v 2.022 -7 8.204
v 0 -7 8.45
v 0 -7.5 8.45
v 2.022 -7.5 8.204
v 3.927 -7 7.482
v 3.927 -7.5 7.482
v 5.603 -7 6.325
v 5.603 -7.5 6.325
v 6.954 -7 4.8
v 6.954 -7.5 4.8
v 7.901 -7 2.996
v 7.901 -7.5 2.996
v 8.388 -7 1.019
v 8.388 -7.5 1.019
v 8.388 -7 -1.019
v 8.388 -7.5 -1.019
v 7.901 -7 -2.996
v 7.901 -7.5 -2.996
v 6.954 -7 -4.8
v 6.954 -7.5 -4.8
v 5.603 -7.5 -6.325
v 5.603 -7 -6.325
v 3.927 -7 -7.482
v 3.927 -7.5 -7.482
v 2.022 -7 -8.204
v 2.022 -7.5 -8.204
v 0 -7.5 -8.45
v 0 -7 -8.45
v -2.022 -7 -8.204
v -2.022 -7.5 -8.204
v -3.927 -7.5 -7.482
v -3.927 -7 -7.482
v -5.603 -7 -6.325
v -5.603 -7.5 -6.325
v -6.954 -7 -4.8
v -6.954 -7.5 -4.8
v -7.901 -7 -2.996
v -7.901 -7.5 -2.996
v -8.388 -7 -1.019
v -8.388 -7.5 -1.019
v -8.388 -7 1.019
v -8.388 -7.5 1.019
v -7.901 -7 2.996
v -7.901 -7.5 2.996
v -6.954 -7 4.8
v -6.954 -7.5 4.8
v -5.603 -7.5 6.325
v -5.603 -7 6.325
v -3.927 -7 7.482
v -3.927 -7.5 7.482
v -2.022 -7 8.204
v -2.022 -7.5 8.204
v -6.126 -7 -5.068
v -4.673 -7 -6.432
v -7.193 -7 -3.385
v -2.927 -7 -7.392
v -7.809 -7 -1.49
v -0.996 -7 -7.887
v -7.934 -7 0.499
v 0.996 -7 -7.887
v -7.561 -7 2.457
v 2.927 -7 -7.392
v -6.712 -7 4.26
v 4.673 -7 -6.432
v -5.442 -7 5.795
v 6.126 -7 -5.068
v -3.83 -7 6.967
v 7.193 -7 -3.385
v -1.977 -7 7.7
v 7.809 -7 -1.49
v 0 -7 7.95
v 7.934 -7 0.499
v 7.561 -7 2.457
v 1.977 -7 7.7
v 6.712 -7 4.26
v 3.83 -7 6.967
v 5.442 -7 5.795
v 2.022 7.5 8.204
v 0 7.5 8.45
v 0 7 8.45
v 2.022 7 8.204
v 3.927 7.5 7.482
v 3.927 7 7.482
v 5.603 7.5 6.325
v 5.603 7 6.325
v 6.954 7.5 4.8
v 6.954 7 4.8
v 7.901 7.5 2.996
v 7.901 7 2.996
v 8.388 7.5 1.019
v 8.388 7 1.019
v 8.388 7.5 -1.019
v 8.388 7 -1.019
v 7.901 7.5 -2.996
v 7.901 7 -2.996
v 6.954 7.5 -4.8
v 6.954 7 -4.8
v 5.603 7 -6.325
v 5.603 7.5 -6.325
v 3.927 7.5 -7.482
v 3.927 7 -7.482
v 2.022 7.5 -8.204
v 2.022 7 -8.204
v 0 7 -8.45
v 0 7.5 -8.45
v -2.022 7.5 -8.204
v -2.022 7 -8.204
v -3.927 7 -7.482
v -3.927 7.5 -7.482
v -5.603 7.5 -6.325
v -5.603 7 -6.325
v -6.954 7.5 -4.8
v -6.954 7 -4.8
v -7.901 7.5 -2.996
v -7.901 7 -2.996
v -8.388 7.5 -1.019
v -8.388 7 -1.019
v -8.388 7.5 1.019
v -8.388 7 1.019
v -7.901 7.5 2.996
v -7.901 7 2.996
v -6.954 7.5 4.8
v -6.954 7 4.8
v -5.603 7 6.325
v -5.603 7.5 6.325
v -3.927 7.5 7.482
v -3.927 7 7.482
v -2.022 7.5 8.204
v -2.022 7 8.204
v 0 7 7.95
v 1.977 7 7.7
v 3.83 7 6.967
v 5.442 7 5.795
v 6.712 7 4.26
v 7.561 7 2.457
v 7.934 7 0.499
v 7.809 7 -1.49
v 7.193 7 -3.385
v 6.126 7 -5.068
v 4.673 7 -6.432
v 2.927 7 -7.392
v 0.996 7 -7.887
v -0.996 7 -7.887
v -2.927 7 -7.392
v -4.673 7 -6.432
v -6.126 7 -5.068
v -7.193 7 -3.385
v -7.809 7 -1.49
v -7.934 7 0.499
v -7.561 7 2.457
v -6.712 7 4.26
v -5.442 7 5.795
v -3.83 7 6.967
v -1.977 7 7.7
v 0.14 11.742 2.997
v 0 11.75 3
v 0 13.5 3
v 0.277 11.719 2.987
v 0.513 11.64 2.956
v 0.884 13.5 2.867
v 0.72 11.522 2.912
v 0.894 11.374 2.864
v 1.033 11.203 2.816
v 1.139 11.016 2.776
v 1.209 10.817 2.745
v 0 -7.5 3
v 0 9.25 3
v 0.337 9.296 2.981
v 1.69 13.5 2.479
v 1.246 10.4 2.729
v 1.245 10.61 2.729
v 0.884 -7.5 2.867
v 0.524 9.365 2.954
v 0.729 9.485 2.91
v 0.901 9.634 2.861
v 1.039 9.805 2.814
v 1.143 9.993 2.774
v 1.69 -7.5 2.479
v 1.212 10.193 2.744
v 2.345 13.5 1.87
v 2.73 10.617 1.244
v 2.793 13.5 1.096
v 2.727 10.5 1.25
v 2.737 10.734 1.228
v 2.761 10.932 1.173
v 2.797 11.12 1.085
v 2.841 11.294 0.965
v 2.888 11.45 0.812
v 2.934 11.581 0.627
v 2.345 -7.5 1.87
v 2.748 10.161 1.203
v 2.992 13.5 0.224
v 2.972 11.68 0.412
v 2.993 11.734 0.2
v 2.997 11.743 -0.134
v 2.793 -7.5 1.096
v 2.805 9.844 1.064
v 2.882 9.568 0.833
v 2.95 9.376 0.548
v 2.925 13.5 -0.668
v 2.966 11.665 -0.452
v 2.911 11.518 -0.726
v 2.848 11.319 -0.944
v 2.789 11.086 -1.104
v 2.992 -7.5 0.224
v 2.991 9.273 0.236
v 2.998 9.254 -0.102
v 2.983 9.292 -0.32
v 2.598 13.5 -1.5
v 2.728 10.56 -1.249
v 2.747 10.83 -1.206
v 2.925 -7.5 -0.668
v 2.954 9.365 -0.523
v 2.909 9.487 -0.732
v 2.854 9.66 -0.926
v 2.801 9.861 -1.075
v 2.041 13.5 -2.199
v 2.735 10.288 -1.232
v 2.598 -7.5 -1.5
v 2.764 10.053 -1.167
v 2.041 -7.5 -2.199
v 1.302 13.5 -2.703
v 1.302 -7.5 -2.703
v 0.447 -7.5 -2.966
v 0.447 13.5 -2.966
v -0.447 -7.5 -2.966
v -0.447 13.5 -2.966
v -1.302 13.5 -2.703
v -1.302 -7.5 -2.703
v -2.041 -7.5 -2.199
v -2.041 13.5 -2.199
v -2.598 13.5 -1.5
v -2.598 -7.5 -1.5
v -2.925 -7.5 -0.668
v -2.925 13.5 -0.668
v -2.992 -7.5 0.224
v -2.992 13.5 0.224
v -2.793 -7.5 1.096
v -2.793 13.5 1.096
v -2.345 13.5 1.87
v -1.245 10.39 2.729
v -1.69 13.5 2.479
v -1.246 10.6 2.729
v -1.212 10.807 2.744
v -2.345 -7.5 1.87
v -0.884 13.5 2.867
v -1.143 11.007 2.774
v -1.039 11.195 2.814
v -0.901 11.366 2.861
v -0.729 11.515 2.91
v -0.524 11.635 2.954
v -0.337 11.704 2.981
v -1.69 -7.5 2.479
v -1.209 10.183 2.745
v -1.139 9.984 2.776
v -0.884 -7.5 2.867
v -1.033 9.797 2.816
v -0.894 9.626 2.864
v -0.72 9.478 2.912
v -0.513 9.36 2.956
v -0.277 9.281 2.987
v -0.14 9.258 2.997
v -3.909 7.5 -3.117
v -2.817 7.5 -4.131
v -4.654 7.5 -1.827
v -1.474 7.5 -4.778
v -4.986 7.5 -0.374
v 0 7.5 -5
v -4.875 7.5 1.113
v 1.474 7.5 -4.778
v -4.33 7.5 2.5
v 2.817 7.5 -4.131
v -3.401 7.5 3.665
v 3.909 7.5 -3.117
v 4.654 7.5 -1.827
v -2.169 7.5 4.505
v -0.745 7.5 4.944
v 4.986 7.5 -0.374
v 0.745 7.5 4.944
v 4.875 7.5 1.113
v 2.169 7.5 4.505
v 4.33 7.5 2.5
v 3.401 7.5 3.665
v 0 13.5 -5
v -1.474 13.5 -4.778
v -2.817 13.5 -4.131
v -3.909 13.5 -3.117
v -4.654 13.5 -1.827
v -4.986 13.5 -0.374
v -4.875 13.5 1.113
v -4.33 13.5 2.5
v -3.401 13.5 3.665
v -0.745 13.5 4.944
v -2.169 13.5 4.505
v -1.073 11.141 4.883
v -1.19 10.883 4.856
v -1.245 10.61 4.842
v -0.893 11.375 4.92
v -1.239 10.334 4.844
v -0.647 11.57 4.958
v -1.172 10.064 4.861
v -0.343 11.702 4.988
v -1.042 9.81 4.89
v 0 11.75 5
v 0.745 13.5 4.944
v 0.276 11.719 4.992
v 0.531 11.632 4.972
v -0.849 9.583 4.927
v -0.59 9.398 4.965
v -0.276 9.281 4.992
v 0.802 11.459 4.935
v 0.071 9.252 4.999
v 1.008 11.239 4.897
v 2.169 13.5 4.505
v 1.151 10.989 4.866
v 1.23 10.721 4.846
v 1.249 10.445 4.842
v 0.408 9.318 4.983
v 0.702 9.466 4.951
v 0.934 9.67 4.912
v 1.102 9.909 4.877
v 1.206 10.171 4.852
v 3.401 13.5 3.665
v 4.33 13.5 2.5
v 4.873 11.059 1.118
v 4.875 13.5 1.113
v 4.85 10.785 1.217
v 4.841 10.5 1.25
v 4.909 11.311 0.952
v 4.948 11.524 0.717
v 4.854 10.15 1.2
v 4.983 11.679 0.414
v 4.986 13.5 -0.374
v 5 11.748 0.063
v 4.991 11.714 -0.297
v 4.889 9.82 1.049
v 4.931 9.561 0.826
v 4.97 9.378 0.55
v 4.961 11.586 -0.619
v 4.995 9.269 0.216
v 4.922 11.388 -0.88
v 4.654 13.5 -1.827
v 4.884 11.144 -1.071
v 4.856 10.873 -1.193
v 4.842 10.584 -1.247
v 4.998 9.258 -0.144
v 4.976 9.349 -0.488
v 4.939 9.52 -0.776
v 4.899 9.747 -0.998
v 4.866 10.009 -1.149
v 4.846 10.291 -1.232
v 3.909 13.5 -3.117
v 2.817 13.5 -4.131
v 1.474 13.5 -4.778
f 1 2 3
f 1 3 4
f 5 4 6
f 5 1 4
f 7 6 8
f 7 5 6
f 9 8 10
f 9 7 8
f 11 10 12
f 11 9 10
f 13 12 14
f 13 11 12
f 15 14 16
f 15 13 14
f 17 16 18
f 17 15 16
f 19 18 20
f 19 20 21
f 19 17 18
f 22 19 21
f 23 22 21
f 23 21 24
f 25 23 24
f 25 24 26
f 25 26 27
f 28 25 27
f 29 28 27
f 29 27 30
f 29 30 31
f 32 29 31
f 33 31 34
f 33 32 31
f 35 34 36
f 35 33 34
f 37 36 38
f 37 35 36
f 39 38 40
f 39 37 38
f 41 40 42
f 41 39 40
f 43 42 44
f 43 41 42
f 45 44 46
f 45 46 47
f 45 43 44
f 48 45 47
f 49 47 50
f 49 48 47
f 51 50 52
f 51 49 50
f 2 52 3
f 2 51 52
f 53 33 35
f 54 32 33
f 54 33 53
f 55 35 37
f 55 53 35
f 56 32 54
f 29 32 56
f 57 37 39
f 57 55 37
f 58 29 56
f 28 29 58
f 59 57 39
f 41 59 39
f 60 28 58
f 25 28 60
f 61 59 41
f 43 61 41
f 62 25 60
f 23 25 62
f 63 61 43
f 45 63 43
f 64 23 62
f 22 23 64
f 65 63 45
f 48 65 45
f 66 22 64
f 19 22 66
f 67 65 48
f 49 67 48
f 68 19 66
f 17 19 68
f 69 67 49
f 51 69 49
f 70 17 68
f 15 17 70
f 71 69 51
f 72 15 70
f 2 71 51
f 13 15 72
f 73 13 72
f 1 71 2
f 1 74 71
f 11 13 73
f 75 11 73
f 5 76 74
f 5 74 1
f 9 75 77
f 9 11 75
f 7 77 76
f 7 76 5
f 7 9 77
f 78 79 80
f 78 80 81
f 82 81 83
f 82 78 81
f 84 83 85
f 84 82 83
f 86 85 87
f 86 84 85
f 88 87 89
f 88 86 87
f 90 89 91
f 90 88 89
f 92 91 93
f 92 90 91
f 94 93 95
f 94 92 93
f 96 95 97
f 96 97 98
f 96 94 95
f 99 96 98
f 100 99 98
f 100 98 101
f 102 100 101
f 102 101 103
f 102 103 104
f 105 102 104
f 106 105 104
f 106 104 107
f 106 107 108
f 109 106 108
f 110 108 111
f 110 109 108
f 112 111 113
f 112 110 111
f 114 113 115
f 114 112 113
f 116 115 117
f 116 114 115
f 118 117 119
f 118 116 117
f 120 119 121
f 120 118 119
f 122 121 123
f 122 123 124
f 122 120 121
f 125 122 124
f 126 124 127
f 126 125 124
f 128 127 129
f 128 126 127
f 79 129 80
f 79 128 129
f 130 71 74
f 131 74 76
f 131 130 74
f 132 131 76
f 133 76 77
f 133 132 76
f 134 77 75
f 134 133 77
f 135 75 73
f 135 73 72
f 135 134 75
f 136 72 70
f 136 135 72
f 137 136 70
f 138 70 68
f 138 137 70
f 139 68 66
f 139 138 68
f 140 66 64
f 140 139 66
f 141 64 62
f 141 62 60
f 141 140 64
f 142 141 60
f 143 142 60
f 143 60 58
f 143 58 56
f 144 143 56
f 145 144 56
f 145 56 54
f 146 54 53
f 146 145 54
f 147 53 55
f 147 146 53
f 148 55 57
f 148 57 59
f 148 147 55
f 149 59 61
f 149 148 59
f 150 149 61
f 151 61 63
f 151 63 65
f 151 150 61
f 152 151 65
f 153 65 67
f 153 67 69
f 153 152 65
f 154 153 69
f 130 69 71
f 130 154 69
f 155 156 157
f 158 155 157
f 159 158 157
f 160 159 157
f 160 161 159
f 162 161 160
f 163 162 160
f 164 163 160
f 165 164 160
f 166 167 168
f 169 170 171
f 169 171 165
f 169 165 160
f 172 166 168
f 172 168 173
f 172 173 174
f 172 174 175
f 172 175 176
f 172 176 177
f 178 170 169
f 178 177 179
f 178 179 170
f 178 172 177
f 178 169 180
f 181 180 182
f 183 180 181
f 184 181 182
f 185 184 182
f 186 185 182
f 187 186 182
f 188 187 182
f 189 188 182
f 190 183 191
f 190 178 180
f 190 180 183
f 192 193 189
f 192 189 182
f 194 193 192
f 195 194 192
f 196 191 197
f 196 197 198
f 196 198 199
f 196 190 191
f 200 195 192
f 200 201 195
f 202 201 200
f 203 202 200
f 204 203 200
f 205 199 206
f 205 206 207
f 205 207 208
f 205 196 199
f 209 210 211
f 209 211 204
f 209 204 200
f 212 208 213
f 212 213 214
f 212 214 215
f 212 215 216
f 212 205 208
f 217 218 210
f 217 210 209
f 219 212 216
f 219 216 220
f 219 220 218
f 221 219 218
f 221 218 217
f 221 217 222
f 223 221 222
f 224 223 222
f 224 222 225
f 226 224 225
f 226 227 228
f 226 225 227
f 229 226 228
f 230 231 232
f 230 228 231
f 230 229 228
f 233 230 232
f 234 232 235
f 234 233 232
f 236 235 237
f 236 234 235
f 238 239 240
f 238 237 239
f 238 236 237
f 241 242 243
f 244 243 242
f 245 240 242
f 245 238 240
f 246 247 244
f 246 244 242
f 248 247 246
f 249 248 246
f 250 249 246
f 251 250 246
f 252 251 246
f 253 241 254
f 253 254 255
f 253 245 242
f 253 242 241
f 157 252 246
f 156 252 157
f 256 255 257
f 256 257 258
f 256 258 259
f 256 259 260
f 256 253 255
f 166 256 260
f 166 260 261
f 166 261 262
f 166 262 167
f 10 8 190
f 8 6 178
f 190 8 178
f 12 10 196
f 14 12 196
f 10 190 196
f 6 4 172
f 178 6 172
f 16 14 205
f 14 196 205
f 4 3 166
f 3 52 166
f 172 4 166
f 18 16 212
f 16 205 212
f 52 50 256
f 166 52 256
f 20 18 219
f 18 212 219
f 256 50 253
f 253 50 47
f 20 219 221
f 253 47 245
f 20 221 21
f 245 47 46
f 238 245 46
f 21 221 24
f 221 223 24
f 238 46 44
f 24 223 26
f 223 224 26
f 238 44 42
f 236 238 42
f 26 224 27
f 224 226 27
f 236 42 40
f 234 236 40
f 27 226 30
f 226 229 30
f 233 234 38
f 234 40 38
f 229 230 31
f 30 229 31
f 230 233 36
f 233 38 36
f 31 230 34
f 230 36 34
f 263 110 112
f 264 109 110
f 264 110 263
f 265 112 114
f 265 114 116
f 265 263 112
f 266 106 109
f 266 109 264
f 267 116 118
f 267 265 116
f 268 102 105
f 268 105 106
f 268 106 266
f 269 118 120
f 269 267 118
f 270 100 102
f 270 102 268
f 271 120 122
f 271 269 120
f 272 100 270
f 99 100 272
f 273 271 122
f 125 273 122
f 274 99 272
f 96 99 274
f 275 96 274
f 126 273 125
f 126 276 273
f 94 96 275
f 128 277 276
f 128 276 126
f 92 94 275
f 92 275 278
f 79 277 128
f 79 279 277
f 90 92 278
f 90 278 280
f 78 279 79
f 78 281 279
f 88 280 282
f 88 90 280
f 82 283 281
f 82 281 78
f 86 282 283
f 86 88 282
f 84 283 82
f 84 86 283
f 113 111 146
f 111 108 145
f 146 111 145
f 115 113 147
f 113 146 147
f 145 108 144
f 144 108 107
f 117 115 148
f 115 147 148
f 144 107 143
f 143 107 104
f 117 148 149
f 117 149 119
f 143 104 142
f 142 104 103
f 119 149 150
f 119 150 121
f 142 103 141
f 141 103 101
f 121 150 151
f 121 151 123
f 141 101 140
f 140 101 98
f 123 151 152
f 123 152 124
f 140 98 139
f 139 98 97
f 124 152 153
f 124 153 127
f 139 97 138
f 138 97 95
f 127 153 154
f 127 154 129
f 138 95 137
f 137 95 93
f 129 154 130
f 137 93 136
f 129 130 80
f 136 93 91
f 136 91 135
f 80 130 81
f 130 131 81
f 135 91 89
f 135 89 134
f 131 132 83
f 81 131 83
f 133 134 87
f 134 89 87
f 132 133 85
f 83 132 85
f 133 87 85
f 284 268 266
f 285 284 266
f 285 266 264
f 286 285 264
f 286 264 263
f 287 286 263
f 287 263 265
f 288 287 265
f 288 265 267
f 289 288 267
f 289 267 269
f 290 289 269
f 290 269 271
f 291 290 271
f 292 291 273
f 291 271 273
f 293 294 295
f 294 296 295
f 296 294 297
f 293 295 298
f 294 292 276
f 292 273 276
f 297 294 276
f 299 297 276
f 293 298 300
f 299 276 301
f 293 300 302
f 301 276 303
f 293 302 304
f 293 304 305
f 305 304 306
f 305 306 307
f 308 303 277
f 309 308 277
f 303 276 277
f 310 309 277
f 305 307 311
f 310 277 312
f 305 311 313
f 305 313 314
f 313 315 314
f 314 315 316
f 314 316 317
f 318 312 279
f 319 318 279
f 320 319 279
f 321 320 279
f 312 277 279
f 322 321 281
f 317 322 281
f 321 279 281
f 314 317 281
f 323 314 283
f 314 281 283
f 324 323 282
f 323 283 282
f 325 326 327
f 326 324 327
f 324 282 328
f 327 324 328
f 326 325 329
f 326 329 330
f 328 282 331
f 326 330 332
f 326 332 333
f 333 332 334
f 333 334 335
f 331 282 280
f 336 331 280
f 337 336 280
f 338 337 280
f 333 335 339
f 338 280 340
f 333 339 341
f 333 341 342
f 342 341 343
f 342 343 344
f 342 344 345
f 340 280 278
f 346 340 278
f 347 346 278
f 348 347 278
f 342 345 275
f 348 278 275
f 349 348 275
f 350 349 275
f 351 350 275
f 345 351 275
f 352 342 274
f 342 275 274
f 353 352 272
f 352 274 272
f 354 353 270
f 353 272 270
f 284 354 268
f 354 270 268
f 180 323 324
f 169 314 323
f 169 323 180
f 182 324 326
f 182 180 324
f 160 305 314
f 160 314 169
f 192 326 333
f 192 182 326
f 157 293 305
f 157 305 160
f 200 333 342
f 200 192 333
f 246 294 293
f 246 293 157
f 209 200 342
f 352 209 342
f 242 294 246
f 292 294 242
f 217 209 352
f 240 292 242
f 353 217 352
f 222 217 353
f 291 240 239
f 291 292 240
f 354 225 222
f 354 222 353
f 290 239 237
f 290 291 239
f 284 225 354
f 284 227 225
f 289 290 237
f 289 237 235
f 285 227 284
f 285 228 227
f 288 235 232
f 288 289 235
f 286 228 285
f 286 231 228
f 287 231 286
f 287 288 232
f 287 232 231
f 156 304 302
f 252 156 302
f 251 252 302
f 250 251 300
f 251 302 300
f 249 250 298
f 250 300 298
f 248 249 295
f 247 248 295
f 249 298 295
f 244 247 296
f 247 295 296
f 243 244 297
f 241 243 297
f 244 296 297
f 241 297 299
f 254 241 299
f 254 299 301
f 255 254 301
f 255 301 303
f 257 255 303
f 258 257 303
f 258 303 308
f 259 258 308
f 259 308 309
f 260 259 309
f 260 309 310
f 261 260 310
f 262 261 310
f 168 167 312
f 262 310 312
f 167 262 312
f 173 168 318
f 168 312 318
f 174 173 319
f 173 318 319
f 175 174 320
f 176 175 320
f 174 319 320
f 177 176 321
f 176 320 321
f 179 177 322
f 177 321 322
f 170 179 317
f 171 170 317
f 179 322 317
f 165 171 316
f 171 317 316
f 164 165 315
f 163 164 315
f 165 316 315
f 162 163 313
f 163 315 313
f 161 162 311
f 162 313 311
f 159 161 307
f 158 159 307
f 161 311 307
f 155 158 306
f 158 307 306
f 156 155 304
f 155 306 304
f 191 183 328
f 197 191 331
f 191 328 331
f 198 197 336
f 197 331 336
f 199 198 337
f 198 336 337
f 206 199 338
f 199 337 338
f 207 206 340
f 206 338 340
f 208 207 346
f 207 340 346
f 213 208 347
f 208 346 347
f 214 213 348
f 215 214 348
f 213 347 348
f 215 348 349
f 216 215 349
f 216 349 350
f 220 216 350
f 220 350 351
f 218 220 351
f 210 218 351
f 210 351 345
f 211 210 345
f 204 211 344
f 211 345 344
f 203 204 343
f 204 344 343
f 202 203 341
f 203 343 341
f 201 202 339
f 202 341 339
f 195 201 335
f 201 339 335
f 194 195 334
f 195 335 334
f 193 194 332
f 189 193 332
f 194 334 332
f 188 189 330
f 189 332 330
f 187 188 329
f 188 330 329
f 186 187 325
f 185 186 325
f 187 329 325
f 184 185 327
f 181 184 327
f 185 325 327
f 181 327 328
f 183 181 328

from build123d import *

# Parameters (mm, degrees)
CROQUIS1_R                 = 7.95
SALIENTE_EXTRUIR1_DEPTH    = 7.5
CROQUIS2_R                 = 8.45
SALIENTE_EXTRUIR2_DEPTH    = 0.5
SALIENTE_EXTRUIR3_START    = -14.5
CROQUIS2_2_R               = 8.45
SALIENTE_EXTRUIR3_DEPTH    = 0.5
CROQUIS3_R                 = 5
SALIENTE_EXTRUIR4_DEPTH    = 21
CORTAR_EXTRUIR1_DEPTH      = 24.728779994
CORTAR_EXTRUIR1_DEPTH_BACK = 24.728779994
CROQUIS4_R                 = 3
CROQUIS7_W                 = 1.25
CROQUIS7_H                 = 5
CROQUIS9_W                 = 1.25
CROQUIS9_H                 = 8.45


with BuildPart() as part:
    # Croquis1 → Saliente-Extruir1 (new, symmetric)
    with BuildSketch(Plane(origin=(0, 0, 0), x_dir=(-1, 0, 0), z_dir=(0, 1, 0))):
        with Locations(Location((0, 0, 0), (0, 0, 90))):
            Circle(CROQUIS1_R)
    extrude(amount=SALIENTE_EXTRUIR1_DEPTH, both=True)

    # Croquis2 → Saliente-Extruir2 (add)
    with BuildSketch(Plane(origin=(0, 7.5, 0), x_dir=(-1, 0, 0), z_dir=(0, 1, 0))):
        with Locations(Location((0, 0, 0), (0, 0, 90))):
            Circle(CROQUIS2_R)
    extrude(amount=-SALIENTE_EXTRUIR2_DEPTH)

    # Croquis2<2> → Saliente-Extruir3 (add)
    with BuildSketch(Plane(origin=(0, 7.5, 0), x_dir=(-1, 0, 0), z_dir=(0, 1, 0)).offset(SALIENTE_EXTRUIR3_START)):
        with Locations(Location((0, 0, 0), (0, 0, 90))):
            Circle(CROQUIS2_2_R)
    extrude(amount=-SALIENTE_EXTRUIR3_DEPTH)

    # Croquis3 → Saliente-Extruir4 (add)
    with BuildSketch(Plane(origin=(0, -7.5, 0), x_dir=(-1, 0, 0), z_dir=(0, 1, 0))):
        with Locations(Location((0, 0, 0), (0, 0, 270))):
            Circle(CROQUIS3_R)
    extrude(amount=SALIENTE_EXTRUIR4_DEPTH)

    # Croquis4 → Cortar-Extruir1 (cut, two sides: drawn at the far end of the back side and taken through both)
    with BuildSketch(Plane(origin=(0, -7, 0), x_dir=(-1, 0, 0), z_dir=(0, 1, 0)).offset(-CORTAR_EXTRUIR1_DEPTH_BACK)):
        with Locations(Location((0, 0, 0), (0, 0, 90))):
            Circle(CROQUIS4_R)
    extrude(amount=CORTAR_EXTRUIR1_DEPTH + CORTAR_EXTRUIR1_DEPTH_BACK, mode=Mode.SUBTRACT)

    # Croquis7 → Taladro roscado M32 (revolve, cut)
    with BuildSketch(Plane.ZX.offset(10.5)):
        with Locations((0.625, 2.5)):
            Rectangle(CROQUIS7_W, CROQUIS7_H)
    revolve(axis=Axis((-6.35, 10.5, 0), (1, 0, 0)), mode=Mode.SUBTRACT)

    # Croquis9 → Taladro roscado M31 (revolve, cut)
    with BuildSketch(Plane(origin=(0, 10.5, 0), x_dir=(0, 1, 0), z_dir=(1, 0, 0))):
        with Locations((0.625, 4.225)):
            Rectangle(CROQUIS9_W, CROQUIS9_H)
    revolve(axis=Axis((0, 10.5, -6.35), (0, 0, 1)), mode=Mode.SUBTRACT)


solid = part.part
